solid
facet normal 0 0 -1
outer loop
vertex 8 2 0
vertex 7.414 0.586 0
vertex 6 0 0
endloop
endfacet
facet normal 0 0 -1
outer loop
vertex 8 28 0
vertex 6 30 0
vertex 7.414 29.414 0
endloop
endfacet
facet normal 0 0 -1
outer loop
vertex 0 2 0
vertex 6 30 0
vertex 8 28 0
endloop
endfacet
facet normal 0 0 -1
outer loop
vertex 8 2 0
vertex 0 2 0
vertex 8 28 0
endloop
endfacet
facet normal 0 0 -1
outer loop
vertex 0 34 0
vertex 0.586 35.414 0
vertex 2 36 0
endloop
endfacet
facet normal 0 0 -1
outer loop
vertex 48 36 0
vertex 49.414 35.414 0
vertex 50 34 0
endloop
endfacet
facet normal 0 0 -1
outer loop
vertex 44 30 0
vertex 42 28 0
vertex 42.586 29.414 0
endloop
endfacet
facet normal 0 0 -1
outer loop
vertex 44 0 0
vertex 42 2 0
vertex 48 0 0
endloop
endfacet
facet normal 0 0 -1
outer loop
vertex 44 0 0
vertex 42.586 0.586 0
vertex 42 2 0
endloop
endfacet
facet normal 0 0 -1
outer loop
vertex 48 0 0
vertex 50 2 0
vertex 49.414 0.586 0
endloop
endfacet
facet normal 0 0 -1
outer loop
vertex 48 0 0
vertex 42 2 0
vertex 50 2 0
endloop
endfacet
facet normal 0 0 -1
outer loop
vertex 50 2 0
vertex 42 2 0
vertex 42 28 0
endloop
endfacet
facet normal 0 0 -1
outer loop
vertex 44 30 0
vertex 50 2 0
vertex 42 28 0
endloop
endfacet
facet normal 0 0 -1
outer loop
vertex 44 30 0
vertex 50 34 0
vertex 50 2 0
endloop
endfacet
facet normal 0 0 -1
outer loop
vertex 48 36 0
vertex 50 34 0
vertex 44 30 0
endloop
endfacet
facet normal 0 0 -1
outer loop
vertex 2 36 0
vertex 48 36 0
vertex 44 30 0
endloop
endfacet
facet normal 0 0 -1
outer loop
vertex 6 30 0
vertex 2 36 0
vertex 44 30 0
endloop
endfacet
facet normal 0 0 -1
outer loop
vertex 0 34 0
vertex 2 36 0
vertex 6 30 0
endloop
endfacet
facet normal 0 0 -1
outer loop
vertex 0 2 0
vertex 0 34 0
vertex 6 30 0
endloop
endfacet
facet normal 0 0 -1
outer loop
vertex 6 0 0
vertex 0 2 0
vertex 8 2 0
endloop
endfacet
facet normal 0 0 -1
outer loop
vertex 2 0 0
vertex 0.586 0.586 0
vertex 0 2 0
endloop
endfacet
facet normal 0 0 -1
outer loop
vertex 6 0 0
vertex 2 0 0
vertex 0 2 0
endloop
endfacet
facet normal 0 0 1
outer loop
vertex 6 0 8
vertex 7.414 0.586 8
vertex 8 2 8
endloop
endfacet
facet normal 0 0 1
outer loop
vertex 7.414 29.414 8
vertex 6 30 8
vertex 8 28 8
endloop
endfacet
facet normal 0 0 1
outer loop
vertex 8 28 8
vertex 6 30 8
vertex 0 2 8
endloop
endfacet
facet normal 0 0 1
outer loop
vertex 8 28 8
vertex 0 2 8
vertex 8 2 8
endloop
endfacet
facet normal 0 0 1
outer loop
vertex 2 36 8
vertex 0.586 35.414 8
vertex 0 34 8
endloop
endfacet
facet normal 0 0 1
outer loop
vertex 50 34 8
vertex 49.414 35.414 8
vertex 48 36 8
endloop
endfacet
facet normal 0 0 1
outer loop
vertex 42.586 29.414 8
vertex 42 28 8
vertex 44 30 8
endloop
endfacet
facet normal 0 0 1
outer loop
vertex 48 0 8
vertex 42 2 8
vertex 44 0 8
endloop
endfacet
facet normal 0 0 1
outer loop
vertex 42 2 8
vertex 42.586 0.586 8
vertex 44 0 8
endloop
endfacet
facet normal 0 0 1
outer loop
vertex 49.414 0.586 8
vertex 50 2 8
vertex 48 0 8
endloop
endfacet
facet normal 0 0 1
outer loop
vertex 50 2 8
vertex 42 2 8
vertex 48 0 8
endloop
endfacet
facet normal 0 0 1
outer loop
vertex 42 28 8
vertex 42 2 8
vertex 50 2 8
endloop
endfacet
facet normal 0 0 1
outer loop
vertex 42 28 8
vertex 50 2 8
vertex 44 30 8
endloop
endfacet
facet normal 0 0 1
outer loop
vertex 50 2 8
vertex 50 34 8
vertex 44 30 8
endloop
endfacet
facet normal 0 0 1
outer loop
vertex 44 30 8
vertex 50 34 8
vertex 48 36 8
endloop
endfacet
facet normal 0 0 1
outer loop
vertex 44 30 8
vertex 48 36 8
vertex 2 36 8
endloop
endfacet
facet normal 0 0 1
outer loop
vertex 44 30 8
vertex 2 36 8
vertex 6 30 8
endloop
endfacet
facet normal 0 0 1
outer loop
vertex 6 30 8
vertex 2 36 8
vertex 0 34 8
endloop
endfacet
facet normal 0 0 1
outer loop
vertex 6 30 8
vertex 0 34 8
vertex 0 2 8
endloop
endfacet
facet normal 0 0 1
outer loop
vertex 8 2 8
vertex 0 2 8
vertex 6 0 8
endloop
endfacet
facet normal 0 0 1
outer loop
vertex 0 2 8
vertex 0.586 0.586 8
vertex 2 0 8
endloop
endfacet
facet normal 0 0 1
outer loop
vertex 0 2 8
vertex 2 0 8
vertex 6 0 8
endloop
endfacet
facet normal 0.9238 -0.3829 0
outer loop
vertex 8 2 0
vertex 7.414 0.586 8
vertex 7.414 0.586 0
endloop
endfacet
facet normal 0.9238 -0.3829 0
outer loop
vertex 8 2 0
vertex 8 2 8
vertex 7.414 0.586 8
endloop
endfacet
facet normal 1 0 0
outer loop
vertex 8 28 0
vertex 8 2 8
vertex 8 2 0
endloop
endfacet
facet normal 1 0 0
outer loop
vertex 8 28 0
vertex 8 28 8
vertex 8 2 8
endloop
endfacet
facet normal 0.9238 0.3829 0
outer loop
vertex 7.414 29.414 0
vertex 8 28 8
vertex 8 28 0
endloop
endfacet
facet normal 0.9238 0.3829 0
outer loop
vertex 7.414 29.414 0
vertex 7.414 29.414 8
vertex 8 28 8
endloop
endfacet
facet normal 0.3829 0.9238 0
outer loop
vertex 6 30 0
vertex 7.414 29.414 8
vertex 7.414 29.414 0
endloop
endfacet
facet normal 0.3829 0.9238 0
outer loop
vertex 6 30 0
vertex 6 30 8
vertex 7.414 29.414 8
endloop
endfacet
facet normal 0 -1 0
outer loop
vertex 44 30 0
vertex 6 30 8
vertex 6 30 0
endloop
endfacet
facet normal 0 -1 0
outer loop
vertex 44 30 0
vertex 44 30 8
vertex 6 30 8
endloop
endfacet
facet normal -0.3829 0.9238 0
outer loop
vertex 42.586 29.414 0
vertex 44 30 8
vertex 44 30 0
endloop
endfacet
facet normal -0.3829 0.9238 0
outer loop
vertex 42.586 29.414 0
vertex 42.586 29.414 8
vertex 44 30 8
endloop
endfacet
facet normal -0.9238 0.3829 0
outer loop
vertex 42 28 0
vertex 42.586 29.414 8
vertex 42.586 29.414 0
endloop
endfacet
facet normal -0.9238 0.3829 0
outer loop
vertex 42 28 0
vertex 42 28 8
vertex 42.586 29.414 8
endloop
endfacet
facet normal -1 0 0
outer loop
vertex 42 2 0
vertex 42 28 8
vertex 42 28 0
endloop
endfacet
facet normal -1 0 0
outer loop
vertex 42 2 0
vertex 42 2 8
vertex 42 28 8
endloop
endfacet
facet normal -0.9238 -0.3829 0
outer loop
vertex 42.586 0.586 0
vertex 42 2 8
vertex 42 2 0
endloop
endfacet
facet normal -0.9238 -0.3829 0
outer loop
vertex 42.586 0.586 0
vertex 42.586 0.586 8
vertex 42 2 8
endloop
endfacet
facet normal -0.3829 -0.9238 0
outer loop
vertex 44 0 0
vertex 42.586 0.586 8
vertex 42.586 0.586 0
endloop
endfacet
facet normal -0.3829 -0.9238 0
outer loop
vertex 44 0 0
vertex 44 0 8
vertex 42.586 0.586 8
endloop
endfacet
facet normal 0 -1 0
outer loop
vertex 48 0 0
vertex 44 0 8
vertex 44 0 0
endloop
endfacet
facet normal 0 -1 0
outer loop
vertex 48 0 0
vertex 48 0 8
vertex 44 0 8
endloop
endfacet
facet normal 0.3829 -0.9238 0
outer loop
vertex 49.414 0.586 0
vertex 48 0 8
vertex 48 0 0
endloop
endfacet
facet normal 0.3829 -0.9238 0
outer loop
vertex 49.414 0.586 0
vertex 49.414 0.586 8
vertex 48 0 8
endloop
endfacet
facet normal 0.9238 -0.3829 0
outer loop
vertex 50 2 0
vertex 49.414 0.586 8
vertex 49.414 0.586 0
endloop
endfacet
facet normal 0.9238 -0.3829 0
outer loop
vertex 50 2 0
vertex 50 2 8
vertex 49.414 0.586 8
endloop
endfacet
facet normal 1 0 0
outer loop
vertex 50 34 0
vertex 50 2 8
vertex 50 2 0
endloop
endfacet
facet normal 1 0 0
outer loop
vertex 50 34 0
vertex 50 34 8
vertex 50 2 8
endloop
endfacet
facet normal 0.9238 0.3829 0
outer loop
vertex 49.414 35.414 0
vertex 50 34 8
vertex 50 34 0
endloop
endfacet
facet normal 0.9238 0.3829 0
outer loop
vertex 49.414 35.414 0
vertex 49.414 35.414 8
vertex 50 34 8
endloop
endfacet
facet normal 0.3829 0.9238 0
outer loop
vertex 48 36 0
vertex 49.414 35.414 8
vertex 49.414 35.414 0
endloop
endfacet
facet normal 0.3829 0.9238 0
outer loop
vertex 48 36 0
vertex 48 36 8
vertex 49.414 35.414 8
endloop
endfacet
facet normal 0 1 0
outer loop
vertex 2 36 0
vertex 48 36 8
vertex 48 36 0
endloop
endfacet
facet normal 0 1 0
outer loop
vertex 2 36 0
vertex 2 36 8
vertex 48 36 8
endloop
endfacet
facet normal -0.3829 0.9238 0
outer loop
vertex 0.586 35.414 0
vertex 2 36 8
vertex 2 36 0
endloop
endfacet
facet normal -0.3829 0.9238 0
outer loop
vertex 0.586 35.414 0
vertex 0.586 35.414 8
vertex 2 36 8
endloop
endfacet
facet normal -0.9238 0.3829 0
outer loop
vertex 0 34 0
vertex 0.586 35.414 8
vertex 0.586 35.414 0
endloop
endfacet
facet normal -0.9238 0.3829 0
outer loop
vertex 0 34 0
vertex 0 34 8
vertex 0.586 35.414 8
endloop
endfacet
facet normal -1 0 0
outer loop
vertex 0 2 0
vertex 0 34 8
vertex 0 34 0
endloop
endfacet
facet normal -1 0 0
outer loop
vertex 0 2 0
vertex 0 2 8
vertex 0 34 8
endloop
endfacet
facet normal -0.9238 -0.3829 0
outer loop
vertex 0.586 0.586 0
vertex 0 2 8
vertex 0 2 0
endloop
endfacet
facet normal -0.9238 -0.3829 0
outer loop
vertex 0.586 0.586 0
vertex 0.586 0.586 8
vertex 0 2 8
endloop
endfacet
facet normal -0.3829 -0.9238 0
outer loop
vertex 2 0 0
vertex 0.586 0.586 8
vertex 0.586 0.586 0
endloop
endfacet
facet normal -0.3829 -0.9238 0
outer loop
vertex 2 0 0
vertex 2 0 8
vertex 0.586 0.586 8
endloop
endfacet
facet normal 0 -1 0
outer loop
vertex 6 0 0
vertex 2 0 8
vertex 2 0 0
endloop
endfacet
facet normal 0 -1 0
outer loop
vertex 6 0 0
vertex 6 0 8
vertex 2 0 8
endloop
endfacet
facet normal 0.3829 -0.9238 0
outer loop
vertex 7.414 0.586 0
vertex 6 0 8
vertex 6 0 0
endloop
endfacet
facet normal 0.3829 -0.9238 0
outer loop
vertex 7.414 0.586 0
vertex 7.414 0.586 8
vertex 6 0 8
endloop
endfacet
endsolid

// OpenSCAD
$fn = 32;

// ----------------------------------------------------------------------
// Clip blank: staple clip, 8 mm thick
// ----------------------------------------------------------------------

// --- parameters (mm) ---
profile_height = 8;       // extrusion height
profile_points = 24;      // points of the closed outline

profile = [[0, 2], [0.586, 0.586], [2, 0], [6, 0], [7.414, 0.586], [8, 2], [8, 28], [7.414, 29.414], [6, 30], [44, 30], [42.586, 29.414], [42, 28], [42, 2], [42.586, 0.586], [44, 0], [48, 0], [49.414, 0.586], [50, 2], [50, 34], [49.414, 35.414], [48, 36], [2, 36], [0.586, 35.414], [0, 34]];  // single closed polygon, 24 points, counter clockwise

// --- the one profile operation ---
linear_extrude(height = profile_height) polygon(points = profile);
